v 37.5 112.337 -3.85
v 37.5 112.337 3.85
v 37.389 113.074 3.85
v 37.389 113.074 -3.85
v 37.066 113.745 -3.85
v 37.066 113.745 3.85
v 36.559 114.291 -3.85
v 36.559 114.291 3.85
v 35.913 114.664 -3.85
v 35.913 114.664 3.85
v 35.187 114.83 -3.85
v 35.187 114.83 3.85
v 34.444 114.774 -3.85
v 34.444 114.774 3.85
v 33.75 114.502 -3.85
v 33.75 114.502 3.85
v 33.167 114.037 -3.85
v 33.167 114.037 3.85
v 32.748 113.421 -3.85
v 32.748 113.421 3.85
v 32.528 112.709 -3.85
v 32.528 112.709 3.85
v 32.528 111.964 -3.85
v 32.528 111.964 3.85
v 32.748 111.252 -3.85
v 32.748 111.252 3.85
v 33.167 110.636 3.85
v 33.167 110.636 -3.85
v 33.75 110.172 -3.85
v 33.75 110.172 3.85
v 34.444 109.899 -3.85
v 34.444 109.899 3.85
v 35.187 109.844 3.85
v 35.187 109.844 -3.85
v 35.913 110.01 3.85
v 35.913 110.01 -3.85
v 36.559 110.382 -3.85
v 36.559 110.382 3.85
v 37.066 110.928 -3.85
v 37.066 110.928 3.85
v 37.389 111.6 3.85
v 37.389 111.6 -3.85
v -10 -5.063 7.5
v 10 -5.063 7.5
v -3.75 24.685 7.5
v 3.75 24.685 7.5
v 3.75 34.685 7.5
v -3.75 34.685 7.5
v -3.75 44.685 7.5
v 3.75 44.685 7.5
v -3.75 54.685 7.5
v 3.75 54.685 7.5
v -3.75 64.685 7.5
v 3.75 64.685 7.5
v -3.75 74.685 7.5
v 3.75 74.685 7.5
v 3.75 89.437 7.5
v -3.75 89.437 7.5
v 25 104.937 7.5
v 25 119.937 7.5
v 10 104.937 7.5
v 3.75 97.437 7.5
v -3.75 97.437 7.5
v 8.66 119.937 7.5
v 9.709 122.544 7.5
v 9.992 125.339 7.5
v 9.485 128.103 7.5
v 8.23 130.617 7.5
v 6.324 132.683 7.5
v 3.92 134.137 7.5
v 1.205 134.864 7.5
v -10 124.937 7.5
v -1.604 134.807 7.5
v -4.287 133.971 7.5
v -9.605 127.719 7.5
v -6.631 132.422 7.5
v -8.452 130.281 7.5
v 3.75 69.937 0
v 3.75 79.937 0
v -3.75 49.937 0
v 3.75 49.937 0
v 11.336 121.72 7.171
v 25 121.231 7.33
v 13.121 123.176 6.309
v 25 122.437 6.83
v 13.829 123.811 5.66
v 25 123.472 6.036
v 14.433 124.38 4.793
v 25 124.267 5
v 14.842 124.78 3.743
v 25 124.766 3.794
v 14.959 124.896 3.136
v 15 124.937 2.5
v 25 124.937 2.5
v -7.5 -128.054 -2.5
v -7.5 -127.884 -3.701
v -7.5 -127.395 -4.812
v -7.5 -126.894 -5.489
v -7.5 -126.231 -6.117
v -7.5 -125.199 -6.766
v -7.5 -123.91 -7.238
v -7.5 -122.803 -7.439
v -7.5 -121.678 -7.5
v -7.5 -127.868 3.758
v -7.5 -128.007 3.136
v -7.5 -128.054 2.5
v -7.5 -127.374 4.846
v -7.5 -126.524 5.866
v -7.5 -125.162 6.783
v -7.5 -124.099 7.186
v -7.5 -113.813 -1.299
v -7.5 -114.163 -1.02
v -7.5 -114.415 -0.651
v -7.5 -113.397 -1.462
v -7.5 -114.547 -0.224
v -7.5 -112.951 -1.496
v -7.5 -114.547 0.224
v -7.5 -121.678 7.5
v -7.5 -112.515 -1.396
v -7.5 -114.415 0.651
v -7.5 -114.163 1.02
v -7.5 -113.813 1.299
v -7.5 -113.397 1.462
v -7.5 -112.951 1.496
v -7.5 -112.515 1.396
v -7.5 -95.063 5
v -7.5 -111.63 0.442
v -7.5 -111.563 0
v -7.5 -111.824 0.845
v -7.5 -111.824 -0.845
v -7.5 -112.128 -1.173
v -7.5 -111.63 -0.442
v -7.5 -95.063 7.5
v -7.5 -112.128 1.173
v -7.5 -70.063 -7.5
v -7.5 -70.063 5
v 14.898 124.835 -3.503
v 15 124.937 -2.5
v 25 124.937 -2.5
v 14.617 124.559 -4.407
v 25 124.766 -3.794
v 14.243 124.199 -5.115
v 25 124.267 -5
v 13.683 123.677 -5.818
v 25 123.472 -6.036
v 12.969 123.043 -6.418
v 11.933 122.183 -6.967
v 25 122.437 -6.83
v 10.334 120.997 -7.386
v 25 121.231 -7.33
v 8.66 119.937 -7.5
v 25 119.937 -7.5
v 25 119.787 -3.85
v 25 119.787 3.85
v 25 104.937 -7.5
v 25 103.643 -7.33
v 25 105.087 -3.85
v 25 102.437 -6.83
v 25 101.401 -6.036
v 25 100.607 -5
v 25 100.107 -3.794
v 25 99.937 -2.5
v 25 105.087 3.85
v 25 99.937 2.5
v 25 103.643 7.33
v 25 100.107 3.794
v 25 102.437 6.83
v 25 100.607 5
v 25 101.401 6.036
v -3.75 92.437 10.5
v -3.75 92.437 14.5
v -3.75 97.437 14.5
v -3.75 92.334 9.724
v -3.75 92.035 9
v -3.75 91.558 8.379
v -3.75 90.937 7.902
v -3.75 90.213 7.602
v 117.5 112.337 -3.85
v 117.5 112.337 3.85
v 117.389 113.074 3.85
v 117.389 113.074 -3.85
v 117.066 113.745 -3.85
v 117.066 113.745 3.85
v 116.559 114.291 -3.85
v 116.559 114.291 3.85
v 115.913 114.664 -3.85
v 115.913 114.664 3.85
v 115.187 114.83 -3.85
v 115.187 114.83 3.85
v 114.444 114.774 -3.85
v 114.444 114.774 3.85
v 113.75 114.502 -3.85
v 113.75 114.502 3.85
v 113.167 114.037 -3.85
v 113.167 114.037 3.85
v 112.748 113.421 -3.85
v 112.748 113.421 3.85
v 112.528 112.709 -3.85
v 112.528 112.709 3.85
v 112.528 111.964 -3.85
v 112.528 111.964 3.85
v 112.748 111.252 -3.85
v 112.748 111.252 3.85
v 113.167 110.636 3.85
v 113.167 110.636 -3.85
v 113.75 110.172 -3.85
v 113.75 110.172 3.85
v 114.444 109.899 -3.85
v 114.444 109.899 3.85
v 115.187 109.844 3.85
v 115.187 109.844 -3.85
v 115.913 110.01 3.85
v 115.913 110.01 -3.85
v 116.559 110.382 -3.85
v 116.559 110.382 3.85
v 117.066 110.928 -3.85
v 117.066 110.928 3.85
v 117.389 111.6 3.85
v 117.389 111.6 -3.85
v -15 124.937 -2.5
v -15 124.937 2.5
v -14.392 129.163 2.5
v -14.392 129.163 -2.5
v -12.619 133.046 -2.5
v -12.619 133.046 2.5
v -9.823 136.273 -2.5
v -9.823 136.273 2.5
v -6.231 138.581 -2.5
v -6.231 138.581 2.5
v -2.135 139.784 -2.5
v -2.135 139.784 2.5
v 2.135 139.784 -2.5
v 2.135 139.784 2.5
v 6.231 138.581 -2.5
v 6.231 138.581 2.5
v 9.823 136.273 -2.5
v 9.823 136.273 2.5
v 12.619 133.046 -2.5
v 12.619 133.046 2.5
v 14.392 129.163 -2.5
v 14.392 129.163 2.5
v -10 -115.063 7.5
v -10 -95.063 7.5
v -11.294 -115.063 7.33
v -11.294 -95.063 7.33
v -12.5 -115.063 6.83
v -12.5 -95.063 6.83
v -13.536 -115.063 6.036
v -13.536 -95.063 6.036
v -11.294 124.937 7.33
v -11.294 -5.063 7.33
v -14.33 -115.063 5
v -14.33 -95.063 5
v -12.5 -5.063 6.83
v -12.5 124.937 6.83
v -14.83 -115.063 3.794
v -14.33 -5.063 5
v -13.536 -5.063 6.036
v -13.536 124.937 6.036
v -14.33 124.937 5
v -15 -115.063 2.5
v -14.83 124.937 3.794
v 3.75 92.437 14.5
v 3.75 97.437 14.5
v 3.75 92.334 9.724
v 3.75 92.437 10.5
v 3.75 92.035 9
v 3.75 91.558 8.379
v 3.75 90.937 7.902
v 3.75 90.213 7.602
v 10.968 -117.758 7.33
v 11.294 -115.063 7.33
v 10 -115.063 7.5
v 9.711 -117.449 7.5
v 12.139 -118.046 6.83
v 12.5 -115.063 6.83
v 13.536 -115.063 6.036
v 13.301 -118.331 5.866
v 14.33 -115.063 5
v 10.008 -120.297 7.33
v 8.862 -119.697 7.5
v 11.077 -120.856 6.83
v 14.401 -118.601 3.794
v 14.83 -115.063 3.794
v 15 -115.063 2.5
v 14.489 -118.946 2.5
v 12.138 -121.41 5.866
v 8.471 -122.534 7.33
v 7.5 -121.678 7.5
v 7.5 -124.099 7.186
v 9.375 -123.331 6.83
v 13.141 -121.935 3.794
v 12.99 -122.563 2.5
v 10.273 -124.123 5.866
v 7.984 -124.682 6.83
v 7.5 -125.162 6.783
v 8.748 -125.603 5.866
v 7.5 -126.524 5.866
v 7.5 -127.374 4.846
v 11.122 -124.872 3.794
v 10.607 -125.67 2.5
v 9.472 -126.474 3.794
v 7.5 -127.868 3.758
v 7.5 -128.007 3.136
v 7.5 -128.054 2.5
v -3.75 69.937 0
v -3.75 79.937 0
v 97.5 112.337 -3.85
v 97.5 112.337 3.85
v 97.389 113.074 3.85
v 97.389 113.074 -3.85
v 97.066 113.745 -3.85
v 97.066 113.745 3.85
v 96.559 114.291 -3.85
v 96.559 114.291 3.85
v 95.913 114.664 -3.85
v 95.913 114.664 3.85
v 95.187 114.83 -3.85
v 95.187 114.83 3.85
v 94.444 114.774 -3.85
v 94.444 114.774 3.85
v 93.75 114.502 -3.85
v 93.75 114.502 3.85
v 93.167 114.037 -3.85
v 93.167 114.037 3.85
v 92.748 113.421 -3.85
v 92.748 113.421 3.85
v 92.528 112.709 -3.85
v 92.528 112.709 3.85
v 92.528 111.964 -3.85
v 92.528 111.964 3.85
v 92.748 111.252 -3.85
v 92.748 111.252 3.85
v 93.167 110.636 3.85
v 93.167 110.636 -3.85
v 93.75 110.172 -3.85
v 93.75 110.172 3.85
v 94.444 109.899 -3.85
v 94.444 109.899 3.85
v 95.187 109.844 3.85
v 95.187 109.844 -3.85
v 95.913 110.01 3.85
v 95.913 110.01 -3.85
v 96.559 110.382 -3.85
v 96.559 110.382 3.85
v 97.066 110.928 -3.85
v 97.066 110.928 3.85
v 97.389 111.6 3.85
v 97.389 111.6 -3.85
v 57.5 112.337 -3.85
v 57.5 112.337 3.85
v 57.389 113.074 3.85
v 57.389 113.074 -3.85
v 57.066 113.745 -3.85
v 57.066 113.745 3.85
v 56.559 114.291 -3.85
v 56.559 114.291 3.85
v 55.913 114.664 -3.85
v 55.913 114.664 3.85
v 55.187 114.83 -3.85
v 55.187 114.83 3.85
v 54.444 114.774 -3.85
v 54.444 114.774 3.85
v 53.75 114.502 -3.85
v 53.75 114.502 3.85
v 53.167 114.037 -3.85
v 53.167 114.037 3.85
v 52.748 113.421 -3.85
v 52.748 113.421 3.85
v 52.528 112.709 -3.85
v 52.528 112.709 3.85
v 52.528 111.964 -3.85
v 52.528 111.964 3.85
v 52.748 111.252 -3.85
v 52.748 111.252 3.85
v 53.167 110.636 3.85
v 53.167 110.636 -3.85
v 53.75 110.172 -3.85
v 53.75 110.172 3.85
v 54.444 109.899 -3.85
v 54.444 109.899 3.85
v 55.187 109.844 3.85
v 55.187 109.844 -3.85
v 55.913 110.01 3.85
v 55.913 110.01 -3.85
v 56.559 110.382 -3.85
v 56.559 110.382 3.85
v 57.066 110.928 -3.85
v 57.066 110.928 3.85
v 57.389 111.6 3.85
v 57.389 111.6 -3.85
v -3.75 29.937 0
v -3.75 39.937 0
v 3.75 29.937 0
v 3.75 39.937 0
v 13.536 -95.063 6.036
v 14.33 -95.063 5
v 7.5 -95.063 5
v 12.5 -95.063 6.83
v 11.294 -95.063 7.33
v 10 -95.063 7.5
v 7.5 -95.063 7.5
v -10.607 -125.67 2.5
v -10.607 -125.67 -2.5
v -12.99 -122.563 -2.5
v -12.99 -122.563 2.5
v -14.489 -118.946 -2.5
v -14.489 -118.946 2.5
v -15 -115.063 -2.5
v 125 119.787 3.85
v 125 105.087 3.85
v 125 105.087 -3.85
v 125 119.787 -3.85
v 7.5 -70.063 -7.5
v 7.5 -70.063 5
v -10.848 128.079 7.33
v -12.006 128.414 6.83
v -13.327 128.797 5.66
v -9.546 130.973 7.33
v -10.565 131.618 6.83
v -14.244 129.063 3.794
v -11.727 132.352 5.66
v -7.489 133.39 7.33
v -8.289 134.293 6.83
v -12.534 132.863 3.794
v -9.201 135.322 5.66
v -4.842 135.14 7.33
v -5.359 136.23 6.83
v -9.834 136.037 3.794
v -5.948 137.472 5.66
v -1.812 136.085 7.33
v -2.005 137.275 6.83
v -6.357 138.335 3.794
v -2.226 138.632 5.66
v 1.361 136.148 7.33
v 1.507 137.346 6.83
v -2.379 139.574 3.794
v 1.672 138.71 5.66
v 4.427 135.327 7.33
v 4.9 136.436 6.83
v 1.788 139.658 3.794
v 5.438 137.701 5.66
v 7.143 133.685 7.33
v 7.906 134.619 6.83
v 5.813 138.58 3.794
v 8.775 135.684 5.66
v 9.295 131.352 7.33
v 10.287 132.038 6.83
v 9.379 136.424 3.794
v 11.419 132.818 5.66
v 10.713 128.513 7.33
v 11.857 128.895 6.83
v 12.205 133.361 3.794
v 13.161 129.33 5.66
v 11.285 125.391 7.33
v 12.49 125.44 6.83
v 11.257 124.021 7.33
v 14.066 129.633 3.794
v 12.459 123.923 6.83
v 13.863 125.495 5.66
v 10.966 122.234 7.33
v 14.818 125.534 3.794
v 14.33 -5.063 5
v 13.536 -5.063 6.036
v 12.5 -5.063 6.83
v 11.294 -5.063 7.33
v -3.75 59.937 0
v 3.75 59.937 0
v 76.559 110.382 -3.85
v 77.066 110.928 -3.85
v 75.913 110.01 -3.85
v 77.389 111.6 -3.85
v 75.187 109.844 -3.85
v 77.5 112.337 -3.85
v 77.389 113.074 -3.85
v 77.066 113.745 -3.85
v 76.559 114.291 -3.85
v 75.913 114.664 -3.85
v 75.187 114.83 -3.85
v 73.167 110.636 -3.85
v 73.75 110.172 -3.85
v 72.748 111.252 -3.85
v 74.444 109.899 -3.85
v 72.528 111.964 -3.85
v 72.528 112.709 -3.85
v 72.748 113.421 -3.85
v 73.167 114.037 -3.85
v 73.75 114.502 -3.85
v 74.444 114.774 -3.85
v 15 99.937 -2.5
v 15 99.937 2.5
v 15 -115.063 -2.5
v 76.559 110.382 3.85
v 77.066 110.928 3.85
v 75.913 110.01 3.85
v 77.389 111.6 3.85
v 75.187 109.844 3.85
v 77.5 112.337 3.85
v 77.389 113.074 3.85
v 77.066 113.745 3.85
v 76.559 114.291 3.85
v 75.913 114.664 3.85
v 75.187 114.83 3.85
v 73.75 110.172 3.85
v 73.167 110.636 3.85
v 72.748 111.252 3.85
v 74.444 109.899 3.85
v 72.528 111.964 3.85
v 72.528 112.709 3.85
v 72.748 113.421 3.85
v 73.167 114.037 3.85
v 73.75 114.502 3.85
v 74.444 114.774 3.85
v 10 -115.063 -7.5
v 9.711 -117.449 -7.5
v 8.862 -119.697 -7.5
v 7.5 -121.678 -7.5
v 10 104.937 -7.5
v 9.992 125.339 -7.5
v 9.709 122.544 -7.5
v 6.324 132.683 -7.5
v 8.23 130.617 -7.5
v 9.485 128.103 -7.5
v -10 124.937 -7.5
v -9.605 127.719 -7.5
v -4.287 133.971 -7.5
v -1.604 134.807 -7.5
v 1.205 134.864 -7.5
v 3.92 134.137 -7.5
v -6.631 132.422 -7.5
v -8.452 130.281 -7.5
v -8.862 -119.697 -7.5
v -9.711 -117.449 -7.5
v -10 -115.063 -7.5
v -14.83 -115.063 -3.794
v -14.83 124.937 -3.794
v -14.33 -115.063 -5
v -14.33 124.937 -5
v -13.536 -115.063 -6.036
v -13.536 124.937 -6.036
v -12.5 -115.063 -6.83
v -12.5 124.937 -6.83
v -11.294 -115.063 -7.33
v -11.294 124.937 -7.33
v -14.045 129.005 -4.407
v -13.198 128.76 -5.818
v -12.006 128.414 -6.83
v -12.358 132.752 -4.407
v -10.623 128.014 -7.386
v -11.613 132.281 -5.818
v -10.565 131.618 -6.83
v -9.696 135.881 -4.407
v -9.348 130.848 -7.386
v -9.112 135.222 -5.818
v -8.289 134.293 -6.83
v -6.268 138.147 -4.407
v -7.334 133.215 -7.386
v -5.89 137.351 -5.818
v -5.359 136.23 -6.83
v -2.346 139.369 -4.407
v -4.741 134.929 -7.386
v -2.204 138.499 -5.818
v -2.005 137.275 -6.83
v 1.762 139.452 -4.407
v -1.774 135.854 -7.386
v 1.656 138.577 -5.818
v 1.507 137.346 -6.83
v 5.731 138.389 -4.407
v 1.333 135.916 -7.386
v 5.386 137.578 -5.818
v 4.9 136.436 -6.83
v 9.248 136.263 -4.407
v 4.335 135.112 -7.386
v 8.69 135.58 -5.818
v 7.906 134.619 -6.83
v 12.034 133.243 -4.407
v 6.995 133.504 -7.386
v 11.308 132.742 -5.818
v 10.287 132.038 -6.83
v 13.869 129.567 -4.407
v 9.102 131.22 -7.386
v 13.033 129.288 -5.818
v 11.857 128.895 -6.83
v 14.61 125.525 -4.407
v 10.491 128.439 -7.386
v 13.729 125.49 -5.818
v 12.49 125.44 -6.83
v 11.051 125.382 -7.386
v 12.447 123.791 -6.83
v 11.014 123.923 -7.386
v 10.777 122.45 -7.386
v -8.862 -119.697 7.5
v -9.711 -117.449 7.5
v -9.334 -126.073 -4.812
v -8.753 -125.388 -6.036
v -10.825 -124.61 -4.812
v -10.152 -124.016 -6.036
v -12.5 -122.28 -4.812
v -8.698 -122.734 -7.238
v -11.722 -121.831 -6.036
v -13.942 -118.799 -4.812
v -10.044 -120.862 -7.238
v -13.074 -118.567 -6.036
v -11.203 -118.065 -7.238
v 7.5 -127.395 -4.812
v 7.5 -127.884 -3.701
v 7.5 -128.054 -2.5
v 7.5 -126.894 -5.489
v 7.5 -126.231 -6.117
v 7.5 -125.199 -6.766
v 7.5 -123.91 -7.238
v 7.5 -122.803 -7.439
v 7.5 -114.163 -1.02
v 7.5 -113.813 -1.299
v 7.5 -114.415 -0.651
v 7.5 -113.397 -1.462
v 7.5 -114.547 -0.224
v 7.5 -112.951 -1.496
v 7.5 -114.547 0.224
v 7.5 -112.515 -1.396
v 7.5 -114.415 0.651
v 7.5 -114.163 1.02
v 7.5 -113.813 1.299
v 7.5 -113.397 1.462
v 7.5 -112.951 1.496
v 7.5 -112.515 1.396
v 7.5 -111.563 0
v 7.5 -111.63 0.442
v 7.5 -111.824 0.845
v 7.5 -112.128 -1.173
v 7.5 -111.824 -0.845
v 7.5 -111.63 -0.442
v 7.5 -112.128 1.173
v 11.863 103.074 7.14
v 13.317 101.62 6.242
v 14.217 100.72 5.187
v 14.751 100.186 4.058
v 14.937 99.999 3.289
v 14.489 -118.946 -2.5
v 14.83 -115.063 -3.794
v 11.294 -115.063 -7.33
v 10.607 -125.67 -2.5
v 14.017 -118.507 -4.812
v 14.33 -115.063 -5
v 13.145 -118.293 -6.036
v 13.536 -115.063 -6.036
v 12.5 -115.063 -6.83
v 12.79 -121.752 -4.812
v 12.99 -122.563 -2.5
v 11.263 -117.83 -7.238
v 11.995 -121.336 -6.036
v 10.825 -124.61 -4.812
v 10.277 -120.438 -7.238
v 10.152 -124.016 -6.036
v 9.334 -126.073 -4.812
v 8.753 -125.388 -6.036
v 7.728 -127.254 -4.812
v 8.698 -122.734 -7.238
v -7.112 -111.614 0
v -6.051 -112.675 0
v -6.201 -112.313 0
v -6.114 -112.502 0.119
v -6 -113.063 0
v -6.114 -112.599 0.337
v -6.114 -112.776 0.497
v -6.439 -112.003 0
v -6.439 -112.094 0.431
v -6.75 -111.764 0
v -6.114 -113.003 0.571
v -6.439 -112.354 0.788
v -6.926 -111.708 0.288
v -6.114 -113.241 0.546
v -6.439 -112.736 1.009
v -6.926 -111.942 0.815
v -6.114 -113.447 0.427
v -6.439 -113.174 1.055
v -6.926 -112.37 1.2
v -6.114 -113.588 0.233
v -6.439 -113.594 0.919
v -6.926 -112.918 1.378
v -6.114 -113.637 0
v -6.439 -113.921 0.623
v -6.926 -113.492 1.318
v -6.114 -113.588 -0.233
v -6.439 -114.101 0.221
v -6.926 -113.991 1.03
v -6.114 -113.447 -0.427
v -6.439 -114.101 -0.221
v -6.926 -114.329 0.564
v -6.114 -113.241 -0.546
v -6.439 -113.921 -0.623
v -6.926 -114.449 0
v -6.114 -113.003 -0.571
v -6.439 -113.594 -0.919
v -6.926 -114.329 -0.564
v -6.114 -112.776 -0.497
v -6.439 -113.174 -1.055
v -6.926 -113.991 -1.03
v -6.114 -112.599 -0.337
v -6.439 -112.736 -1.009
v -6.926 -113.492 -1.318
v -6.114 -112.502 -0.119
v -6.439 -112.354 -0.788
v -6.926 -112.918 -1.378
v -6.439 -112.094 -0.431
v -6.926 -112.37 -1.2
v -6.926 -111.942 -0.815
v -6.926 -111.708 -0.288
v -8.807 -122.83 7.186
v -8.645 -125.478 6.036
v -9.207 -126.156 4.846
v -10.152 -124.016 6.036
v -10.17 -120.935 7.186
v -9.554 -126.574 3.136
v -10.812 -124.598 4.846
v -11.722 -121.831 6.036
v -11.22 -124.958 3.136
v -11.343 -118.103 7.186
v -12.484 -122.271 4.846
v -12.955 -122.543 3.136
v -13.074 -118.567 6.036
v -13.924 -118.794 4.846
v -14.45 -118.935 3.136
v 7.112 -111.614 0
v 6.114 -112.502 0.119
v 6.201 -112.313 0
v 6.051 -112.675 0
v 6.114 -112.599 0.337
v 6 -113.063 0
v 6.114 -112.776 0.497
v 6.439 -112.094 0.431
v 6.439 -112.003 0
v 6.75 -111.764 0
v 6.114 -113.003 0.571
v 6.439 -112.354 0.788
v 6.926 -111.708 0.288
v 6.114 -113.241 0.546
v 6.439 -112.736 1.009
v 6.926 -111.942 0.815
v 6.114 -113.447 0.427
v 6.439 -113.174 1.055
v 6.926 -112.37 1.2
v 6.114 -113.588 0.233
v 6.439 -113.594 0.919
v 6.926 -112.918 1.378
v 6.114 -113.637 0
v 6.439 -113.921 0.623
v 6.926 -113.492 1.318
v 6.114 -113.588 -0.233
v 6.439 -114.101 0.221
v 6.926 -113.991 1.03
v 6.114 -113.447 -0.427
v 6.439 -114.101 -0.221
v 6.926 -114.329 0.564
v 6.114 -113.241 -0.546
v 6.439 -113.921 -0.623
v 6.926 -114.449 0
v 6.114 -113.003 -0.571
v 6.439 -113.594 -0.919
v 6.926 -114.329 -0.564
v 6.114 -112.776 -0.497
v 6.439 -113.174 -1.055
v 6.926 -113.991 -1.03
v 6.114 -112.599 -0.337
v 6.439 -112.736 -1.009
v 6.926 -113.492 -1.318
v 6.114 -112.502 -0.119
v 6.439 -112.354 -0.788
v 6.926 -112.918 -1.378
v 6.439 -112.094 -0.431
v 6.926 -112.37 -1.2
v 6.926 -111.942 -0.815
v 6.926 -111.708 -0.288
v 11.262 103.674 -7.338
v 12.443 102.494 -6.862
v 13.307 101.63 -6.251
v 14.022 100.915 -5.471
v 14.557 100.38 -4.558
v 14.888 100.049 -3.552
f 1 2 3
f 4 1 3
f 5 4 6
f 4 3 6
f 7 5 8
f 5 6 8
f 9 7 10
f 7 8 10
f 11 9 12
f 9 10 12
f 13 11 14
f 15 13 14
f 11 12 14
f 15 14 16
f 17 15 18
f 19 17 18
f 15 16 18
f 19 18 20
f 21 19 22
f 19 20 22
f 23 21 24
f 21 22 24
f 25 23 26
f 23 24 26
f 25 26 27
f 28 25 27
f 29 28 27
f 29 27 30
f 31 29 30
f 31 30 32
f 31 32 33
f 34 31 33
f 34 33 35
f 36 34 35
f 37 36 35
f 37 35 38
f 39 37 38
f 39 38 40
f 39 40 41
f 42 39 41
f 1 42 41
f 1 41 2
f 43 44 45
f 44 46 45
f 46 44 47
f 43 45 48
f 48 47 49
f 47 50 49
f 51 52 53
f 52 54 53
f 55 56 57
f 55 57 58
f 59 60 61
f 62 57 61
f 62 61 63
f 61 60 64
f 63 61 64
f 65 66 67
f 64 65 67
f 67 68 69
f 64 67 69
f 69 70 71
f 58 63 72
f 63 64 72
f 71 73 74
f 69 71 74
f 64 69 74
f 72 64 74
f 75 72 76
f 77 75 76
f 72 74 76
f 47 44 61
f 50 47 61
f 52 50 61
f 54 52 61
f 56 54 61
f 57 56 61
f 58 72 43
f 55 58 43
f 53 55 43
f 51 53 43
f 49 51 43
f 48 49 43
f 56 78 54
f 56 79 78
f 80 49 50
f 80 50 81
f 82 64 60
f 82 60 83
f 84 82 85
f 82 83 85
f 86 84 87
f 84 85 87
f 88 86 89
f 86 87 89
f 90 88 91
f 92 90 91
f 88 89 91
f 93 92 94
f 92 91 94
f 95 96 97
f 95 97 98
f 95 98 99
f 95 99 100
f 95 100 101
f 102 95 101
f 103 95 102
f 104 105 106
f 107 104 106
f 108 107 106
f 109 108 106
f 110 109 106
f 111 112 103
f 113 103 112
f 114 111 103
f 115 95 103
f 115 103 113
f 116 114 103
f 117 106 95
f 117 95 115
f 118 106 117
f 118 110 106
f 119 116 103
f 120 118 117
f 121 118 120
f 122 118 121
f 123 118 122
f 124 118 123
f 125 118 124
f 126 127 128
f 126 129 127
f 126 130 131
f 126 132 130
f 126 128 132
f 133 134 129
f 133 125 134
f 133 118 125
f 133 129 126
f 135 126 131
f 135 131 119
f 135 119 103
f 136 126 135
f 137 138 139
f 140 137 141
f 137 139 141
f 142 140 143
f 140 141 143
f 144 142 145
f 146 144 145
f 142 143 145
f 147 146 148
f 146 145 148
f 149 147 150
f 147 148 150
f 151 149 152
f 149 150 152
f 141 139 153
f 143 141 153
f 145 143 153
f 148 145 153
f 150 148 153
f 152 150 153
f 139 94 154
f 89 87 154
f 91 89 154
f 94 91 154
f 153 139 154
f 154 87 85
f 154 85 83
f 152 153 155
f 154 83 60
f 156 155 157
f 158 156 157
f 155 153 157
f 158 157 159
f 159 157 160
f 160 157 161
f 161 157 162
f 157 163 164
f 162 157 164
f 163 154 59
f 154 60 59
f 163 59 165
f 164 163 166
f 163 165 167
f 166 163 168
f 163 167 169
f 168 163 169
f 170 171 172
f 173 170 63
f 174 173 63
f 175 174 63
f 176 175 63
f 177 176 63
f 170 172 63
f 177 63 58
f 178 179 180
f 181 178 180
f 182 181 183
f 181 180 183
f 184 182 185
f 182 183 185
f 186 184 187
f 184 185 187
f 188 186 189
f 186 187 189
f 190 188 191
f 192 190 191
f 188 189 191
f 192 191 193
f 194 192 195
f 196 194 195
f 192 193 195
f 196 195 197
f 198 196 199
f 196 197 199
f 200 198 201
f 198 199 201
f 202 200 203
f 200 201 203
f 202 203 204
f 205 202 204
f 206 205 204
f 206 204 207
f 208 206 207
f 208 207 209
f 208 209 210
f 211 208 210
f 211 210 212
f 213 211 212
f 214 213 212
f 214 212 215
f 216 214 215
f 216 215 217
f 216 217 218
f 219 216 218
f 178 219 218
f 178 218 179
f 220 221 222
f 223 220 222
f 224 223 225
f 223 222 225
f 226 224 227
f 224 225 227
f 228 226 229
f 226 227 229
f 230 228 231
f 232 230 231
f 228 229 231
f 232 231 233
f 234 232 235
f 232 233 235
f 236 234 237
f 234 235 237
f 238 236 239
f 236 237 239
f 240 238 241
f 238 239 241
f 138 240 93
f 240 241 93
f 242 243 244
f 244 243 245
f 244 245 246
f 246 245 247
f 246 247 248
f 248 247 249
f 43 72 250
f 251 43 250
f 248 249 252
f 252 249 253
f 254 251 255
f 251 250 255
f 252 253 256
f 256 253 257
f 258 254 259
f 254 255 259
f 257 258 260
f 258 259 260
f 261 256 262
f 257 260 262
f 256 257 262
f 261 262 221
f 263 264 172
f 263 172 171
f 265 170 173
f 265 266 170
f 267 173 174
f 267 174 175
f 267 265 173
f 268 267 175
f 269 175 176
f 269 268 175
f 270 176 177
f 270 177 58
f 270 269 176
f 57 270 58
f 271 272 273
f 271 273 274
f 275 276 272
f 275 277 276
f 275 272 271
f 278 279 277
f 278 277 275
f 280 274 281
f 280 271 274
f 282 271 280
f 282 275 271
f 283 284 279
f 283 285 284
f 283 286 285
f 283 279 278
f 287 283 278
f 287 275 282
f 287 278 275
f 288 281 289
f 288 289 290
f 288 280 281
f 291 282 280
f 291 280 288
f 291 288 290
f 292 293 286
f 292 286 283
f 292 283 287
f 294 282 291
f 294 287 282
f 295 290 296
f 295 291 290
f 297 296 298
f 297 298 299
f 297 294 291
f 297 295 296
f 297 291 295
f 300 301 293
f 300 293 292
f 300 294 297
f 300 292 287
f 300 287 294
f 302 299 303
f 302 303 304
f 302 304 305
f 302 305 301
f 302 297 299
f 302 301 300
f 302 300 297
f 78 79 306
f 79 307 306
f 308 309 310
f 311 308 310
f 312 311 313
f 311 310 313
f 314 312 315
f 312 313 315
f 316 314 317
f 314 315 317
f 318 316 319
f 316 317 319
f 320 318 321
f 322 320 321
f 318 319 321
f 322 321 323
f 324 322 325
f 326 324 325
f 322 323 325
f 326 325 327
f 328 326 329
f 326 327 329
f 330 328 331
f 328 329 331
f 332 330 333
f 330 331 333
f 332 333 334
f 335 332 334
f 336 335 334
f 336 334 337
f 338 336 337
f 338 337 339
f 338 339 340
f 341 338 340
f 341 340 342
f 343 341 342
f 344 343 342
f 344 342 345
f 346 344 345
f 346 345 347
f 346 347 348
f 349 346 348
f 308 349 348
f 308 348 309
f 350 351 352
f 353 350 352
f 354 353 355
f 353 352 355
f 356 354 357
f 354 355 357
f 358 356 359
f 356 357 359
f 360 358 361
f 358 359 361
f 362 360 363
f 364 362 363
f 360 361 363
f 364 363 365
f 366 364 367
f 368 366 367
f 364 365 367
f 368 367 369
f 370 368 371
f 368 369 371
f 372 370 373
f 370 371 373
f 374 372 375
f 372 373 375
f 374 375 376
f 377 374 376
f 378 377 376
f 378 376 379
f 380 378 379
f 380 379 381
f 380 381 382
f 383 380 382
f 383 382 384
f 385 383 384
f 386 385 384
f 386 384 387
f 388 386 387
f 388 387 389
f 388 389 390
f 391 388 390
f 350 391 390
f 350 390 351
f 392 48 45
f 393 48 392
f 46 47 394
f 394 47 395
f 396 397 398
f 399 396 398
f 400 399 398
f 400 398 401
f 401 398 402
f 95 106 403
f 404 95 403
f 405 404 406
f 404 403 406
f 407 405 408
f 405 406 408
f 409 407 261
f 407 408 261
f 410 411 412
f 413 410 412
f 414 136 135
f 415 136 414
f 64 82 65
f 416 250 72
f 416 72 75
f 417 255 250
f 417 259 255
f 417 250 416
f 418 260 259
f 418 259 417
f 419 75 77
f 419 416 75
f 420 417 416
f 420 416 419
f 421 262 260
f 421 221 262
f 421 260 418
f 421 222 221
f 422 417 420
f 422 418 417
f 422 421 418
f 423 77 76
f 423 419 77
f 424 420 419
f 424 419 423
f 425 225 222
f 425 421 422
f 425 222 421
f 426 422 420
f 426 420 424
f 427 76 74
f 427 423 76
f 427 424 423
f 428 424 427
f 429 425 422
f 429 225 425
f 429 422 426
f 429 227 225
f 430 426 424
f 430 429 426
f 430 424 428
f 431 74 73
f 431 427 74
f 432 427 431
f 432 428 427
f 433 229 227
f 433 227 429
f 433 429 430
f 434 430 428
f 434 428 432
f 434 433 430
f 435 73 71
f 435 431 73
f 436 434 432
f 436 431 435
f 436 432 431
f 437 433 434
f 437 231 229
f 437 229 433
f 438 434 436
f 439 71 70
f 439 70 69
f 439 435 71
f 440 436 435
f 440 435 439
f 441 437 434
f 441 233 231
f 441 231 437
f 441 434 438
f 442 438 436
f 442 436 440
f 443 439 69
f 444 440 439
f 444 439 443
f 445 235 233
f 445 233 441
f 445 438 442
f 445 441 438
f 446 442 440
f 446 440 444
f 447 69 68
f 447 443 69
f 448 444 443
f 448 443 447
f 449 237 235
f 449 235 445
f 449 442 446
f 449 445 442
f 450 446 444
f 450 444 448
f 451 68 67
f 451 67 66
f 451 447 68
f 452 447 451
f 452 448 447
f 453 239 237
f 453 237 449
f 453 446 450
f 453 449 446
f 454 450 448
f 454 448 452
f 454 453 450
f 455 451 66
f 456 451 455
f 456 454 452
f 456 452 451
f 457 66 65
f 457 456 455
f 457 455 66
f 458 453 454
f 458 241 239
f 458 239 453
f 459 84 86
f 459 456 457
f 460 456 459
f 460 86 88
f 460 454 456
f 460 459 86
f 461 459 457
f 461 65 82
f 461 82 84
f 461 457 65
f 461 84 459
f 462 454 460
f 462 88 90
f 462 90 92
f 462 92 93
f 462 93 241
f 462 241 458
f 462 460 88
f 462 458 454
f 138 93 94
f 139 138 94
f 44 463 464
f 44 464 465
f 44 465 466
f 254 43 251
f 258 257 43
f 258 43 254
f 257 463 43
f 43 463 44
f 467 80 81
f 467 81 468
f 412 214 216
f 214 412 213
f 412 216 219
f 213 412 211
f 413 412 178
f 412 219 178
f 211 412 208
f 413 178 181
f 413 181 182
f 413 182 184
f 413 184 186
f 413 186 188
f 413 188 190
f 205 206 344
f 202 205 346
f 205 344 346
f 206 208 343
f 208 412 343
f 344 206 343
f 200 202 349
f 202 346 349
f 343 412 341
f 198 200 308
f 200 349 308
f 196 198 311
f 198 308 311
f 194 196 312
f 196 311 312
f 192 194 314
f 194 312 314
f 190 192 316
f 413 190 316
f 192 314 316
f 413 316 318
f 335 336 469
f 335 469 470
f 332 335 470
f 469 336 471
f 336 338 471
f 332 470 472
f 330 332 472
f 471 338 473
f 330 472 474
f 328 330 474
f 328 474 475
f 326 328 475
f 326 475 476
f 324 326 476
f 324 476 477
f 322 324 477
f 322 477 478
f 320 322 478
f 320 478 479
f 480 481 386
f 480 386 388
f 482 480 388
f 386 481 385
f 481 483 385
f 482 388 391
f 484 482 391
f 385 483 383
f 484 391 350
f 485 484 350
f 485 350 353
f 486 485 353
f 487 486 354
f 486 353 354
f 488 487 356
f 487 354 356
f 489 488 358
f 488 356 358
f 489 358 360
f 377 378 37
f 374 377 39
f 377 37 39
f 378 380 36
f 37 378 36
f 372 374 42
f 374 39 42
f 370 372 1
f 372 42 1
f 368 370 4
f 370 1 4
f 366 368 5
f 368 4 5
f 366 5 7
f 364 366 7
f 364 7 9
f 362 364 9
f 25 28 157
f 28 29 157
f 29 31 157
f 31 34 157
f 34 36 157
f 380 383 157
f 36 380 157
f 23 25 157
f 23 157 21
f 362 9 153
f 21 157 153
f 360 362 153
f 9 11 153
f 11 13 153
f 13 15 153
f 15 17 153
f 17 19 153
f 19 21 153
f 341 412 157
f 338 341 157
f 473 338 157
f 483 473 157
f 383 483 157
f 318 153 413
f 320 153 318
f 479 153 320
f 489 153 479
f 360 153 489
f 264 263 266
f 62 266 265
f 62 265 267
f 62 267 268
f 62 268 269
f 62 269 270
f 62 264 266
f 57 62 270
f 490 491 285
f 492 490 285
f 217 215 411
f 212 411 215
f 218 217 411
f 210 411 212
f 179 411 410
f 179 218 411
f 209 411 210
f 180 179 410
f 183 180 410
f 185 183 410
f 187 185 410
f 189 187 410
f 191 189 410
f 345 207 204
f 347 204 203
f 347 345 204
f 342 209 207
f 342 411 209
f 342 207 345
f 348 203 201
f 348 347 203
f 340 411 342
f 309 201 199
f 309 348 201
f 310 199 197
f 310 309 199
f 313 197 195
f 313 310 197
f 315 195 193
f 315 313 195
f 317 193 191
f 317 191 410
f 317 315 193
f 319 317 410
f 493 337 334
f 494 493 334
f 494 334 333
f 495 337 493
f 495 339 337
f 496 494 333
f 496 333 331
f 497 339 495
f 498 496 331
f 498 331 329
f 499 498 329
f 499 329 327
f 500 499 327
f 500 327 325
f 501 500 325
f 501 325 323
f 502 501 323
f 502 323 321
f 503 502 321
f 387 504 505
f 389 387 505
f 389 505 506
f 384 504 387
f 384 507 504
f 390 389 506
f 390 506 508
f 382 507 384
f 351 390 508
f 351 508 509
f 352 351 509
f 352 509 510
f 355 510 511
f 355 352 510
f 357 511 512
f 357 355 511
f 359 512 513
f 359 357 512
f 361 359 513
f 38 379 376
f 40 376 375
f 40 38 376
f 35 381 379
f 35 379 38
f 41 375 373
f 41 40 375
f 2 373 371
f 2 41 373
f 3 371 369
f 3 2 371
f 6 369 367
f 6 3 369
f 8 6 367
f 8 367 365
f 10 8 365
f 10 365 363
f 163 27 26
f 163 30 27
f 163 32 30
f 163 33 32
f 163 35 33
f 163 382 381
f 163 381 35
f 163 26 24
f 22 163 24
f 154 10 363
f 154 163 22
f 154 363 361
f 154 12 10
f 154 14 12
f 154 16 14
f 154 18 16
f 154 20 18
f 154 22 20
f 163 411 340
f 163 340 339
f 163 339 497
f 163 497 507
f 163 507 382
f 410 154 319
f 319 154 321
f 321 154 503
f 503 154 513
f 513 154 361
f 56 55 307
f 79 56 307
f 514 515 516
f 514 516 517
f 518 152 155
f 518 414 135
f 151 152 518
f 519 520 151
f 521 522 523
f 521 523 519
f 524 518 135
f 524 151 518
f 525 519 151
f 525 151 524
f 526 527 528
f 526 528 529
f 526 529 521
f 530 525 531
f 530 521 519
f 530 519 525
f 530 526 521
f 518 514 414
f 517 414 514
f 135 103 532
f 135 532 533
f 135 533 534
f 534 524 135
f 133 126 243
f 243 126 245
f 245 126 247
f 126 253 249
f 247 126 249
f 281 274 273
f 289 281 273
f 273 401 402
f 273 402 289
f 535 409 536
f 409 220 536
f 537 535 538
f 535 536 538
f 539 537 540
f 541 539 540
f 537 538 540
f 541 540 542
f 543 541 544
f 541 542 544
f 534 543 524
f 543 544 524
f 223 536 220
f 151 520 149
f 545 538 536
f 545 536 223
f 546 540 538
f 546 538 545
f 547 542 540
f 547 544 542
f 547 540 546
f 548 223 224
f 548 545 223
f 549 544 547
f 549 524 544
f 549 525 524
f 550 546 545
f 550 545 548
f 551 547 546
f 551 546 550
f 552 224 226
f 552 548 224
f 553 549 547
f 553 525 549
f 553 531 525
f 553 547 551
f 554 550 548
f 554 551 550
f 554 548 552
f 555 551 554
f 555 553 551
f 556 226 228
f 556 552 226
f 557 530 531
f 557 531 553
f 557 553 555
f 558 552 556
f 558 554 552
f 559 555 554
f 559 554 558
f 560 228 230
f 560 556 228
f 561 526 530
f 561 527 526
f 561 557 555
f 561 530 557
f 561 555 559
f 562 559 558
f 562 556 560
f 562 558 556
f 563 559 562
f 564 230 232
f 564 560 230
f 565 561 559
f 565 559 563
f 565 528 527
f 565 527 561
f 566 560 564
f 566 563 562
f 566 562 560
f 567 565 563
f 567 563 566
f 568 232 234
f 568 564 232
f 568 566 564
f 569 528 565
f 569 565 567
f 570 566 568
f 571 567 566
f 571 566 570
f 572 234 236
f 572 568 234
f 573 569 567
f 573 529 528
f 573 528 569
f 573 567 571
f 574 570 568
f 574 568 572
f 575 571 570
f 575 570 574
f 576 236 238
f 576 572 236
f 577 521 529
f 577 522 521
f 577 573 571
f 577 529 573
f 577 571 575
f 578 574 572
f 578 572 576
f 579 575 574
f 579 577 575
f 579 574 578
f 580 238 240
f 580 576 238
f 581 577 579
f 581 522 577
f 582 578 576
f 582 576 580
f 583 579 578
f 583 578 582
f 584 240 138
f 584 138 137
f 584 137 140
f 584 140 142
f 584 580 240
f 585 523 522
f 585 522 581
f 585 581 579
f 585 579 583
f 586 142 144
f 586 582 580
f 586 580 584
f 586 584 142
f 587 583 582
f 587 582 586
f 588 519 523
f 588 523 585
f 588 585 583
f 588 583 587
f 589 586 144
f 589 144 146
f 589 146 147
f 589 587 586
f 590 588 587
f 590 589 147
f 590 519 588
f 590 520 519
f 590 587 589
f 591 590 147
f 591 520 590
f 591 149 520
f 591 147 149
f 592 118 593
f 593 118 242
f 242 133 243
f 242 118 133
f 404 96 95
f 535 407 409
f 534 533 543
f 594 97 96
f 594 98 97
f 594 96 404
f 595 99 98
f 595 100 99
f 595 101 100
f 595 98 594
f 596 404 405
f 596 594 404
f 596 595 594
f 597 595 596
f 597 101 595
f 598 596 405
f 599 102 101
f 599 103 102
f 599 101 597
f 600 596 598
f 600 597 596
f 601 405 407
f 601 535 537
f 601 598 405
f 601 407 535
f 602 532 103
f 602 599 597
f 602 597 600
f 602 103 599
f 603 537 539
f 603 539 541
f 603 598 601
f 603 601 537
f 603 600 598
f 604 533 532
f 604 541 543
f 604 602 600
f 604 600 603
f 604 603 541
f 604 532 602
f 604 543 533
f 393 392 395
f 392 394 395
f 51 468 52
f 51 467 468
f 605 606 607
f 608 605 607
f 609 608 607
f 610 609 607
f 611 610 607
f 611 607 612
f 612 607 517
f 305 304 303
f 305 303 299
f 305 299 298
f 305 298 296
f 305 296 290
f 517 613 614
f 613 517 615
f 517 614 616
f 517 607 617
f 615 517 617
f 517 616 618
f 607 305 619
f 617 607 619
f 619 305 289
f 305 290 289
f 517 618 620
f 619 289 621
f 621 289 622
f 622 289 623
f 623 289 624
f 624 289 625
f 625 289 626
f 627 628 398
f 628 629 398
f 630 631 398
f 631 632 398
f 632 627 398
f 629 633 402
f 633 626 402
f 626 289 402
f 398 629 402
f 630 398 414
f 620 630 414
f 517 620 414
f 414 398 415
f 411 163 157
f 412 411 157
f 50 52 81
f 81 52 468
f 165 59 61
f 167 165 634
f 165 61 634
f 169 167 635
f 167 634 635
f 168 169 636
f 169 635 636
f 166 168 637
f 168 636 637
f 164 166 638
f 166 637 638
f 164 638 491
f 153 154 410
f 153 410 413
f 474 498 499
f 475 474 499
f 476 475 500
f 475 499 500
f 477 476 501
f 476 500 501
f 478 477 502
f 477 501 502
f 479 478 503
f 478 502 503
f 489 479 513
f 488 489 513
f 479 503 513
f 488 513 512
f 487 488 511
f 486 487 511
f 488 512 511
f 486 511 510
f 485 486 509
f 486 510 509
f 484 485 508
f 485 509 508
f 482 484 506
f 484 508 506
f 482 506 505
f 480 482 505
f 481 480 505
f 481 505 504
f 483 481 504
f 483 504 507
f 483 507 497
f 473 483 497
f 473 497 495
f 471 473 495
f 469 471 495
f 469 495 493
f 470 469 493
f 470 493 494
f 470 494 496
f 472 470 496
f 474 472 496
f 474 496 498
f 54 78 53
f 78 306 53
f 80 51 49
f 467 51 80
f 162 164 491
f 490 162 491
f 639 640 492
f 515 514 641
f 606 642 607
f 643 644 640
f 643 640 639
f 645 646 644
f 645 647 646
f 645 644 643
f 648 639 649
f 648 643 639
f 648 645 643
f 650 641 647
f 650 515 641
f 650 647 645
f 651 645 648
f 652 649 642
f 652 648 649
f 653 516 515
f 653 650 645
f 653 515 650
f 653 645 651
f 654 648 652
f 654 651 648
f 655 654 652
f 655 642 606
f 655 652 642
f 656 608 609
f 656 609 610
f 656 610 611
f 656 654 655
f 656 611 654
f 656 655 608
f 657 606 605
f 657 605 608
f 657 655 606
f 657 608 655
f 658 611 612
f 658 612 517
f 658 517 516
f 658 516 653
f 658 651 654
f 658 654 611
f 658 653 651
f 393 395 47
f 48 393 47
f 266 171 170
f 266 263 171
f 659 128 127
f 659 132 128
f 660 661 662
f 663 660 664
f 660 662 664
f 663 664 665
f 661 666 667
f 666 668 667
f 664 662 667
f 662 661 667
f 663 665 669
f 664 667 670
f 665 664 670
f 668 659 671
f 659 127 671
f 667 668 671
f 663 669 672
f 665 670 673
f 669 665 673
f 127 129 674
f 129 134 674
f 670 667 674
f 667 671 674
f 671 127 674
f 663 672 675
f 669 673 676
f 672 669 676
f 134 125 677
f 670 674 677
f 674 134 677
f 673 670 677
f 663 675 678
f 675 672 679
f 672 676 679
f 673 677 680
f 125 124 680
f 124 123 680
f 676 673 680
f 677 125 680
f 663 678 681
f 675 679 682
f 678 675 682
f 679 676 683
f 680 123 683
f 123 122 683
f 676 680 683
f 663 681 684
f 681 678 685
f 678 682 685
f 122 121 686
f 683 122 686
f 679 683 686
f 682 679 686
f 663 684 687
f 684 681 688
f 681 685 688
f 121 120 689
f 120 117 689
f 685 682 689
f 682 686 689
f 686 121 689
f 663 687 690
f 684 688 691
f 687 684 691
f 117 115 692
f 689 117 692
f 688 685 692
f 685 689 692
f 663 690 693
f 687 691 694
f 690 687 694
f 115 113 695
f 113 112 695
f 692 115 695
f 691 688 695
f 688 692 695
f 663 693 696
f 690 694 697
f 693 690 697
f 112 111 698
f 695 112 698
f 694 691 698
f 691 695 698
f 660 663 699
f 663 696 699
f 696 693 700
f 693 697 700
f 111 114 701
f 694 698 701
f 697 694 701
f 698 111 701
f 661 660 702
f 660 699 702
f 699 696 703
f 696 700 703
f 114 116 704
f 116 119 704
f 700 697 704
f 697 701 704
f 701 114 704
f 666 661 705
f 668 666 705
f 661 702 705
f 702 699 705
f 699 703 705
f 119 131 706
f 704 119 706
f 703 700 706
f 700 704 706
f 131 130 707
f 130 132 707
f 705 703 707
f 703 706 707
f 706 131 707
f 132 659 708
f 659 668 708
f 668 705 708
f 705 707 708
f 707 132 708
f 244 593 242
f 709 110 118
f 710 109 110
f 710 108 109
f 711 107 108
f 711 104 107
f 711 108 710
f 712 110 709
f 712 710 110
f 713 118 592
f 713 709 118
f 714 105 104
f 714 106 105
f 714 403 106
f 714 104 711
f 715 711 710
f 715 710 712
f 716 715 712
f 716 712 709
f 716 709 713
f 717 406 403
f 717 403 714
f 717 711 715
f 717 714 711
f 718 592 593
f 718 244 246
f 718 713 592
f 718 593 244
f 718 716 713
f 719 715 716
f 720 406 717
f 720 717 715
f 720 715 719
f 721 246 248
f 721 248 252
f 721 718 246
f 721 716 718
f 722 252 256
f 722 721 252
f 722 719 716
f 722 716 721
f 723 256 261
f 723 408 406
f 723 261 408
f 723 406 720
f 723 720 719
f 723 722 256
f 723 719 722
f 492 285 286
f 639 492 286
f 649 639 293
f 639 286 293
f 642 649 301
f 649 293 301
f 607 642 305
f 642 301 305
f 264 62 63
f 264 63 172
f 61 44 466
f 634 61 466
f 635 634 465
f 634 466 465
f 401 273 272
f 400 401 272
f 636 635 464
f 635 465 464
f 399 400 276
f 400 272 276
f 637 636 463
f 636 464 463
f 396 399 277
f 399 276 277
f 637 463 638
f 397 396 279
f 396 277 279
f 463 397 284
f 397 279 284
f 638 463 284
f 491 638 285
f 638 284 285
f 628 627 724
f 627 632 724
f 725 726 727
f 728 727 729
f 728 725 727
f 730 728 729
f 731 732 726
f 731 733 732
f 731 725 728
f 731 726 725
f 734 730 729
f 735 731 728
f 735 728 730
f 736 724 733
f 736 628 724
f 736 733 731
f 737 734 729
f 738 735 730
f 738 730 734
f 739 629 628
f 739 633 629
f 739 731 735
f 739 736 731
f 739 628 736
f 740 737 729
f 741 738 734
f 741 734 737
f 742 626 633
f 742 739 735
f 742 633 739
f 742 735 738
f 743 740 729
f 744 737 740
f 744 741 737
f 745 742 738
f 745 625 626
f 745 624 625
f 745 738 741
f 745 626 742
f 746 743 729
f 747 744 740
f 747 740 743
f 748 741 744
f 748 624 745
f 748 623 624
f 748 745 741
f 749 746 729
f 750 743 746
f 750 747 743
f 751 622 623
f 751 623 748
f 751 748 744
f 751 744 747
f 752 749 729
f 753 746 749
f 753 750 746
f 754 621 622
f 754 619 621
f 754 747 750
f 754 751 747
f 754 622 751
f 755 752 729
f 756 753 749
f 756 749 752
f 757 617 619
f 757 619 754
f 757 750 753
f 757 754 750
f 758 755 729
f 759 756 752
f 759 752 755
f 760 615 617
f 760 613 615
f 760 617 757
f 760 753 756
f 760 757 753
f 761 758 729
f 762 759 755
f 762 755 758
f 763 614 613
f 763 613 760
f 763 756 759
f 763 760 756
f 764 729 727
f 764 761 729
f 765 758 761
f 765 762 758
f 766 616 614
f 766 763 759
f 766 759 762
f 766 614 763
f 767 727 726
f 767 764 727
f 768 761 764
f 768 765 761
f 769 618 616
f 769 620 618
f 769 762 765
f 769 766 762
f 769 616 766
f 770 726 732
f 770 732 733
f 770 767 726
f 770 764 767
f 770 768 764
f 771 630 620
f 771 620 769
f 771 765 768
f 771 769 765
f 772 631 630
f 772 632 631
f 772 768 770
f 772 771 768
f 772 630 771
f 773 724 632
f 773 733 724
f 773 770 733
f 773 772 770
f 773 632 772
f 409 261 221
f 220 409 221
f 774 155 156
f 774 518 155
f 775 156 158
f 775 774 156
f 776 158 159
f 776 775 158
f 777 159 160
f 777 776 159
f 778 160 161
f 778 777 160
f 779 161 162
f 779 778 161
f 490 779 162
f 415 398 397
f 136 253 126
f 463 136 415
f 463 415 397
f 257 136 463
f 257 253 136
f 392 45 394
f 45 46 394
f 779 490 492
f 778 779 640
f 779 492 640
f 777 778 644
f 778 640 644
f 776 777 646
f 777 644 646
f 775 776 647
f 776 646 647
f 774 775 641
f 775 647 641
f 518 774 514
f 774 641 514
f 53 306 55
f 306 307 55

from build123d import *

# Parameters (mm, degrees)
BOSS_EXTRUDE1_DEPTH = 7.5
FILLET1_R           = 5
SKETCH2_W           = 7.7
SKETCH2_H           = 14.7
BOSS_EXTRUDE2_DEPTH = 100
SKETCH3_R           = 2.5
CUT_EXTRUDE1_DEPTH  = 100
SKETCH4_W           = 15
SKETCH4_H           = 60
CUT_EXTRUDE2_DEPTH  = 100
CUT_EXTRUDE3_DEPTH  = 3.75
BOSS_EXTRUDE3_DEPTH = 3.75
SKETCH10_W          = 2.5
SKETCH10_H          = 90
CUT_EXTRUDE4_DEPTH  = 199.475521198


with BuildPart() as part:
    # Sketch1 → Boss-Extrude1 (new, symmetric)
    with BuildSketch(Plane.XY):
        with BuildLine():
            Line((15, 99.936708861), (15, -115.063291139))
            ThreePointArc((15, -115.063291139), (0, -130.063291139), (-15, -115.063291139))
            Line((-15, -115.063291139), (-15, 124.936708861))
            ThreePointArc((-15, 124.936708861), (0, 139.936708861), (15, 124.936708861))
            Line((15, 124.936708861), (25, 124.936708861))
            Line((25, 124.936708861), (25, 99.936708861))
            Line((25, 99.936708861), (15, 99.936708861))
        make_face()
    extrude(amount=BOSS_EXTRUDE1_DEPTH, both=True)

    # Fillet1
    fillet1_edges = [part.edges().sort_by_distance(p)[0] for p in [
        (0, 139.936708861, -7.5),
        (0, -130.063291139, 7.5),
        (15, -7.563291139, 7.5),
        (20, 99.936708861, 7.5),
        (20, 124.936708861, 7.5),
        (0, 139.936708861, 7.5),
        (20, 124.936708861, -7.5),
        (20, 99.936708861, -7.5),
        (15, -7.563291139, -7.5),
        (-15, 4.936708861, 7.5),
        (0, -130.063291139, -7.5),
        (-15, 4.936708861, -7.5),
    ]]
    fillet(fillet1_edges, radius=FILLET1_R)

    # Sketch2 → Boss-Extrude2 (add)
    with BuildSketch(Plane(origin=(25, 0, 0), x_dir=(0, 0, -1), z_dir=(1, 0, 0))):
        with Locations((0, 112.436708861)):
            Rectangle(SKETCH2_W, SKETCH2_H)
    extrude(amount=BOSS_EXTRUDE2_DEPTH)

    # Sketch3 → Cut-Extrude1 (cut)
    with BuildSketch(Plane.XY.offset(3.85)):
        with Locations((35, 112.336708861)):
            Circle(SKETCH3_R)
        with Locations((55, 112.336708861)):
            Circle(SKETCH3_R)
        with Locations((75, 112.336708861)):
            Circle(SKETCH3_R)
        with Locations((95, 112.336708861)):
            Circle(SKETCH3_R)
        with Locations((115, 112.336708861)):
            Circle(SKETCH3_R)
    extrude(amount=-CUT_EXTRUDE1_DEPTH, mode=Mode.SUBTRACT)

    # Sketch4 → Cut-Extrude2 (cut)
    with BuildSketch(Plane.XY.offset(7.5)):
        with Locations((0, -100.063291139)):
            Rectangle(SKETCH4_W, SKETCH4_H)
    extrude(amount=-CUT_EXTRUDE2_DEPTH, mode=Mode.SUBTRACT)

    # Sketch7 → Cut-Extrude3 (cut, symmetric)
    with BuildSketch(Plane(origin=(0, 0, 0), x_dir=(0, 0, -1), z_dir=(1, 0, 0))):
        Polygon((0, 69.936708861), (-7.5, 64.685152324), (-7.5, 74.685152324), (0, 79.936708861), align=None)
        Polygon((0, 49.936708861), (0, 59.936708861), (-7.5, 54.685152324), (-7.5, 44.685152324), align=None)
        Polygon((0, 29.936708861), (0, 39.936708861), (-7.5, 34.685152324), (-7.5, 24.685152324), align=None)
    extrude(amount=CUT_EXTRUDE3_DEPTH, both=True, mode=Mode.SUBTRACT)

    # Sketch8 → Revolve1 (revolve)
    with BuildSketch(Plane.XY):
        with BuildLine():
            Line((-7.5, -113.063291139), (-6, -113.063291139))
            ThreePointArc((-6, -113.063291139), (-6.439339828, -112.002630967), (-7.5, -111.563291139))
            Line((-7.5, -111.563291139), (-7.5, -113.063291139))
        make_face()
        with BuildLine():
            Line((7.5, -113.063291139), (6, -113.063291139))
            ThreePointArc((6, -113.063291139), (6.439339828, -112.002630967), (7.5, -111.563291139))
            Line((7.5, -111.563291139), (7.5, -113.063291139))
        make_face()
    revolve(axis=Axis((-28.138828416, -113.063291139, 0), (1, 0, 0)))

    # Sketch9 → Boss-Extrude3 (add, symmetric)
    with BuildSketch(Plane(origin=(0, 0, 0), x_dir=(0, 0, -1), z_dir=(1, 0, 0))):
        with BuildLine():
            Line((-7.5, 89.436708861), (-7.5, 97.436708861))
            Line((-7.5, 97.436708861), (-14.5, 97.436708861))
            Line((-14.5, 97.436708861), (-14.5, 92.436708861))
            Line((-14.5, 92.436708861), (-10.5, 92.436708861))
            ThreePointArc((-10.5, 92.436708861), (-8.378679656, 91.558029204), (-7.5, 89.436708861))
        make_face()
    extrude(amount=BOSS_EXTRUDE3_DEPTH, both=True)

    # Sketch10 → Cut-Extrude4 (cut, through all)
    with BuildSketch(Plane.ZY.offset(15)):
        with Locations((6.25, -50.063291139)):
            Rectangle(SKETCH10_W, SKETCH10_H)
    extrude(amount=-CUT_EXTRUDE4_DEPTH, mode=Mode.SUBTRACT)


solid = part.part
